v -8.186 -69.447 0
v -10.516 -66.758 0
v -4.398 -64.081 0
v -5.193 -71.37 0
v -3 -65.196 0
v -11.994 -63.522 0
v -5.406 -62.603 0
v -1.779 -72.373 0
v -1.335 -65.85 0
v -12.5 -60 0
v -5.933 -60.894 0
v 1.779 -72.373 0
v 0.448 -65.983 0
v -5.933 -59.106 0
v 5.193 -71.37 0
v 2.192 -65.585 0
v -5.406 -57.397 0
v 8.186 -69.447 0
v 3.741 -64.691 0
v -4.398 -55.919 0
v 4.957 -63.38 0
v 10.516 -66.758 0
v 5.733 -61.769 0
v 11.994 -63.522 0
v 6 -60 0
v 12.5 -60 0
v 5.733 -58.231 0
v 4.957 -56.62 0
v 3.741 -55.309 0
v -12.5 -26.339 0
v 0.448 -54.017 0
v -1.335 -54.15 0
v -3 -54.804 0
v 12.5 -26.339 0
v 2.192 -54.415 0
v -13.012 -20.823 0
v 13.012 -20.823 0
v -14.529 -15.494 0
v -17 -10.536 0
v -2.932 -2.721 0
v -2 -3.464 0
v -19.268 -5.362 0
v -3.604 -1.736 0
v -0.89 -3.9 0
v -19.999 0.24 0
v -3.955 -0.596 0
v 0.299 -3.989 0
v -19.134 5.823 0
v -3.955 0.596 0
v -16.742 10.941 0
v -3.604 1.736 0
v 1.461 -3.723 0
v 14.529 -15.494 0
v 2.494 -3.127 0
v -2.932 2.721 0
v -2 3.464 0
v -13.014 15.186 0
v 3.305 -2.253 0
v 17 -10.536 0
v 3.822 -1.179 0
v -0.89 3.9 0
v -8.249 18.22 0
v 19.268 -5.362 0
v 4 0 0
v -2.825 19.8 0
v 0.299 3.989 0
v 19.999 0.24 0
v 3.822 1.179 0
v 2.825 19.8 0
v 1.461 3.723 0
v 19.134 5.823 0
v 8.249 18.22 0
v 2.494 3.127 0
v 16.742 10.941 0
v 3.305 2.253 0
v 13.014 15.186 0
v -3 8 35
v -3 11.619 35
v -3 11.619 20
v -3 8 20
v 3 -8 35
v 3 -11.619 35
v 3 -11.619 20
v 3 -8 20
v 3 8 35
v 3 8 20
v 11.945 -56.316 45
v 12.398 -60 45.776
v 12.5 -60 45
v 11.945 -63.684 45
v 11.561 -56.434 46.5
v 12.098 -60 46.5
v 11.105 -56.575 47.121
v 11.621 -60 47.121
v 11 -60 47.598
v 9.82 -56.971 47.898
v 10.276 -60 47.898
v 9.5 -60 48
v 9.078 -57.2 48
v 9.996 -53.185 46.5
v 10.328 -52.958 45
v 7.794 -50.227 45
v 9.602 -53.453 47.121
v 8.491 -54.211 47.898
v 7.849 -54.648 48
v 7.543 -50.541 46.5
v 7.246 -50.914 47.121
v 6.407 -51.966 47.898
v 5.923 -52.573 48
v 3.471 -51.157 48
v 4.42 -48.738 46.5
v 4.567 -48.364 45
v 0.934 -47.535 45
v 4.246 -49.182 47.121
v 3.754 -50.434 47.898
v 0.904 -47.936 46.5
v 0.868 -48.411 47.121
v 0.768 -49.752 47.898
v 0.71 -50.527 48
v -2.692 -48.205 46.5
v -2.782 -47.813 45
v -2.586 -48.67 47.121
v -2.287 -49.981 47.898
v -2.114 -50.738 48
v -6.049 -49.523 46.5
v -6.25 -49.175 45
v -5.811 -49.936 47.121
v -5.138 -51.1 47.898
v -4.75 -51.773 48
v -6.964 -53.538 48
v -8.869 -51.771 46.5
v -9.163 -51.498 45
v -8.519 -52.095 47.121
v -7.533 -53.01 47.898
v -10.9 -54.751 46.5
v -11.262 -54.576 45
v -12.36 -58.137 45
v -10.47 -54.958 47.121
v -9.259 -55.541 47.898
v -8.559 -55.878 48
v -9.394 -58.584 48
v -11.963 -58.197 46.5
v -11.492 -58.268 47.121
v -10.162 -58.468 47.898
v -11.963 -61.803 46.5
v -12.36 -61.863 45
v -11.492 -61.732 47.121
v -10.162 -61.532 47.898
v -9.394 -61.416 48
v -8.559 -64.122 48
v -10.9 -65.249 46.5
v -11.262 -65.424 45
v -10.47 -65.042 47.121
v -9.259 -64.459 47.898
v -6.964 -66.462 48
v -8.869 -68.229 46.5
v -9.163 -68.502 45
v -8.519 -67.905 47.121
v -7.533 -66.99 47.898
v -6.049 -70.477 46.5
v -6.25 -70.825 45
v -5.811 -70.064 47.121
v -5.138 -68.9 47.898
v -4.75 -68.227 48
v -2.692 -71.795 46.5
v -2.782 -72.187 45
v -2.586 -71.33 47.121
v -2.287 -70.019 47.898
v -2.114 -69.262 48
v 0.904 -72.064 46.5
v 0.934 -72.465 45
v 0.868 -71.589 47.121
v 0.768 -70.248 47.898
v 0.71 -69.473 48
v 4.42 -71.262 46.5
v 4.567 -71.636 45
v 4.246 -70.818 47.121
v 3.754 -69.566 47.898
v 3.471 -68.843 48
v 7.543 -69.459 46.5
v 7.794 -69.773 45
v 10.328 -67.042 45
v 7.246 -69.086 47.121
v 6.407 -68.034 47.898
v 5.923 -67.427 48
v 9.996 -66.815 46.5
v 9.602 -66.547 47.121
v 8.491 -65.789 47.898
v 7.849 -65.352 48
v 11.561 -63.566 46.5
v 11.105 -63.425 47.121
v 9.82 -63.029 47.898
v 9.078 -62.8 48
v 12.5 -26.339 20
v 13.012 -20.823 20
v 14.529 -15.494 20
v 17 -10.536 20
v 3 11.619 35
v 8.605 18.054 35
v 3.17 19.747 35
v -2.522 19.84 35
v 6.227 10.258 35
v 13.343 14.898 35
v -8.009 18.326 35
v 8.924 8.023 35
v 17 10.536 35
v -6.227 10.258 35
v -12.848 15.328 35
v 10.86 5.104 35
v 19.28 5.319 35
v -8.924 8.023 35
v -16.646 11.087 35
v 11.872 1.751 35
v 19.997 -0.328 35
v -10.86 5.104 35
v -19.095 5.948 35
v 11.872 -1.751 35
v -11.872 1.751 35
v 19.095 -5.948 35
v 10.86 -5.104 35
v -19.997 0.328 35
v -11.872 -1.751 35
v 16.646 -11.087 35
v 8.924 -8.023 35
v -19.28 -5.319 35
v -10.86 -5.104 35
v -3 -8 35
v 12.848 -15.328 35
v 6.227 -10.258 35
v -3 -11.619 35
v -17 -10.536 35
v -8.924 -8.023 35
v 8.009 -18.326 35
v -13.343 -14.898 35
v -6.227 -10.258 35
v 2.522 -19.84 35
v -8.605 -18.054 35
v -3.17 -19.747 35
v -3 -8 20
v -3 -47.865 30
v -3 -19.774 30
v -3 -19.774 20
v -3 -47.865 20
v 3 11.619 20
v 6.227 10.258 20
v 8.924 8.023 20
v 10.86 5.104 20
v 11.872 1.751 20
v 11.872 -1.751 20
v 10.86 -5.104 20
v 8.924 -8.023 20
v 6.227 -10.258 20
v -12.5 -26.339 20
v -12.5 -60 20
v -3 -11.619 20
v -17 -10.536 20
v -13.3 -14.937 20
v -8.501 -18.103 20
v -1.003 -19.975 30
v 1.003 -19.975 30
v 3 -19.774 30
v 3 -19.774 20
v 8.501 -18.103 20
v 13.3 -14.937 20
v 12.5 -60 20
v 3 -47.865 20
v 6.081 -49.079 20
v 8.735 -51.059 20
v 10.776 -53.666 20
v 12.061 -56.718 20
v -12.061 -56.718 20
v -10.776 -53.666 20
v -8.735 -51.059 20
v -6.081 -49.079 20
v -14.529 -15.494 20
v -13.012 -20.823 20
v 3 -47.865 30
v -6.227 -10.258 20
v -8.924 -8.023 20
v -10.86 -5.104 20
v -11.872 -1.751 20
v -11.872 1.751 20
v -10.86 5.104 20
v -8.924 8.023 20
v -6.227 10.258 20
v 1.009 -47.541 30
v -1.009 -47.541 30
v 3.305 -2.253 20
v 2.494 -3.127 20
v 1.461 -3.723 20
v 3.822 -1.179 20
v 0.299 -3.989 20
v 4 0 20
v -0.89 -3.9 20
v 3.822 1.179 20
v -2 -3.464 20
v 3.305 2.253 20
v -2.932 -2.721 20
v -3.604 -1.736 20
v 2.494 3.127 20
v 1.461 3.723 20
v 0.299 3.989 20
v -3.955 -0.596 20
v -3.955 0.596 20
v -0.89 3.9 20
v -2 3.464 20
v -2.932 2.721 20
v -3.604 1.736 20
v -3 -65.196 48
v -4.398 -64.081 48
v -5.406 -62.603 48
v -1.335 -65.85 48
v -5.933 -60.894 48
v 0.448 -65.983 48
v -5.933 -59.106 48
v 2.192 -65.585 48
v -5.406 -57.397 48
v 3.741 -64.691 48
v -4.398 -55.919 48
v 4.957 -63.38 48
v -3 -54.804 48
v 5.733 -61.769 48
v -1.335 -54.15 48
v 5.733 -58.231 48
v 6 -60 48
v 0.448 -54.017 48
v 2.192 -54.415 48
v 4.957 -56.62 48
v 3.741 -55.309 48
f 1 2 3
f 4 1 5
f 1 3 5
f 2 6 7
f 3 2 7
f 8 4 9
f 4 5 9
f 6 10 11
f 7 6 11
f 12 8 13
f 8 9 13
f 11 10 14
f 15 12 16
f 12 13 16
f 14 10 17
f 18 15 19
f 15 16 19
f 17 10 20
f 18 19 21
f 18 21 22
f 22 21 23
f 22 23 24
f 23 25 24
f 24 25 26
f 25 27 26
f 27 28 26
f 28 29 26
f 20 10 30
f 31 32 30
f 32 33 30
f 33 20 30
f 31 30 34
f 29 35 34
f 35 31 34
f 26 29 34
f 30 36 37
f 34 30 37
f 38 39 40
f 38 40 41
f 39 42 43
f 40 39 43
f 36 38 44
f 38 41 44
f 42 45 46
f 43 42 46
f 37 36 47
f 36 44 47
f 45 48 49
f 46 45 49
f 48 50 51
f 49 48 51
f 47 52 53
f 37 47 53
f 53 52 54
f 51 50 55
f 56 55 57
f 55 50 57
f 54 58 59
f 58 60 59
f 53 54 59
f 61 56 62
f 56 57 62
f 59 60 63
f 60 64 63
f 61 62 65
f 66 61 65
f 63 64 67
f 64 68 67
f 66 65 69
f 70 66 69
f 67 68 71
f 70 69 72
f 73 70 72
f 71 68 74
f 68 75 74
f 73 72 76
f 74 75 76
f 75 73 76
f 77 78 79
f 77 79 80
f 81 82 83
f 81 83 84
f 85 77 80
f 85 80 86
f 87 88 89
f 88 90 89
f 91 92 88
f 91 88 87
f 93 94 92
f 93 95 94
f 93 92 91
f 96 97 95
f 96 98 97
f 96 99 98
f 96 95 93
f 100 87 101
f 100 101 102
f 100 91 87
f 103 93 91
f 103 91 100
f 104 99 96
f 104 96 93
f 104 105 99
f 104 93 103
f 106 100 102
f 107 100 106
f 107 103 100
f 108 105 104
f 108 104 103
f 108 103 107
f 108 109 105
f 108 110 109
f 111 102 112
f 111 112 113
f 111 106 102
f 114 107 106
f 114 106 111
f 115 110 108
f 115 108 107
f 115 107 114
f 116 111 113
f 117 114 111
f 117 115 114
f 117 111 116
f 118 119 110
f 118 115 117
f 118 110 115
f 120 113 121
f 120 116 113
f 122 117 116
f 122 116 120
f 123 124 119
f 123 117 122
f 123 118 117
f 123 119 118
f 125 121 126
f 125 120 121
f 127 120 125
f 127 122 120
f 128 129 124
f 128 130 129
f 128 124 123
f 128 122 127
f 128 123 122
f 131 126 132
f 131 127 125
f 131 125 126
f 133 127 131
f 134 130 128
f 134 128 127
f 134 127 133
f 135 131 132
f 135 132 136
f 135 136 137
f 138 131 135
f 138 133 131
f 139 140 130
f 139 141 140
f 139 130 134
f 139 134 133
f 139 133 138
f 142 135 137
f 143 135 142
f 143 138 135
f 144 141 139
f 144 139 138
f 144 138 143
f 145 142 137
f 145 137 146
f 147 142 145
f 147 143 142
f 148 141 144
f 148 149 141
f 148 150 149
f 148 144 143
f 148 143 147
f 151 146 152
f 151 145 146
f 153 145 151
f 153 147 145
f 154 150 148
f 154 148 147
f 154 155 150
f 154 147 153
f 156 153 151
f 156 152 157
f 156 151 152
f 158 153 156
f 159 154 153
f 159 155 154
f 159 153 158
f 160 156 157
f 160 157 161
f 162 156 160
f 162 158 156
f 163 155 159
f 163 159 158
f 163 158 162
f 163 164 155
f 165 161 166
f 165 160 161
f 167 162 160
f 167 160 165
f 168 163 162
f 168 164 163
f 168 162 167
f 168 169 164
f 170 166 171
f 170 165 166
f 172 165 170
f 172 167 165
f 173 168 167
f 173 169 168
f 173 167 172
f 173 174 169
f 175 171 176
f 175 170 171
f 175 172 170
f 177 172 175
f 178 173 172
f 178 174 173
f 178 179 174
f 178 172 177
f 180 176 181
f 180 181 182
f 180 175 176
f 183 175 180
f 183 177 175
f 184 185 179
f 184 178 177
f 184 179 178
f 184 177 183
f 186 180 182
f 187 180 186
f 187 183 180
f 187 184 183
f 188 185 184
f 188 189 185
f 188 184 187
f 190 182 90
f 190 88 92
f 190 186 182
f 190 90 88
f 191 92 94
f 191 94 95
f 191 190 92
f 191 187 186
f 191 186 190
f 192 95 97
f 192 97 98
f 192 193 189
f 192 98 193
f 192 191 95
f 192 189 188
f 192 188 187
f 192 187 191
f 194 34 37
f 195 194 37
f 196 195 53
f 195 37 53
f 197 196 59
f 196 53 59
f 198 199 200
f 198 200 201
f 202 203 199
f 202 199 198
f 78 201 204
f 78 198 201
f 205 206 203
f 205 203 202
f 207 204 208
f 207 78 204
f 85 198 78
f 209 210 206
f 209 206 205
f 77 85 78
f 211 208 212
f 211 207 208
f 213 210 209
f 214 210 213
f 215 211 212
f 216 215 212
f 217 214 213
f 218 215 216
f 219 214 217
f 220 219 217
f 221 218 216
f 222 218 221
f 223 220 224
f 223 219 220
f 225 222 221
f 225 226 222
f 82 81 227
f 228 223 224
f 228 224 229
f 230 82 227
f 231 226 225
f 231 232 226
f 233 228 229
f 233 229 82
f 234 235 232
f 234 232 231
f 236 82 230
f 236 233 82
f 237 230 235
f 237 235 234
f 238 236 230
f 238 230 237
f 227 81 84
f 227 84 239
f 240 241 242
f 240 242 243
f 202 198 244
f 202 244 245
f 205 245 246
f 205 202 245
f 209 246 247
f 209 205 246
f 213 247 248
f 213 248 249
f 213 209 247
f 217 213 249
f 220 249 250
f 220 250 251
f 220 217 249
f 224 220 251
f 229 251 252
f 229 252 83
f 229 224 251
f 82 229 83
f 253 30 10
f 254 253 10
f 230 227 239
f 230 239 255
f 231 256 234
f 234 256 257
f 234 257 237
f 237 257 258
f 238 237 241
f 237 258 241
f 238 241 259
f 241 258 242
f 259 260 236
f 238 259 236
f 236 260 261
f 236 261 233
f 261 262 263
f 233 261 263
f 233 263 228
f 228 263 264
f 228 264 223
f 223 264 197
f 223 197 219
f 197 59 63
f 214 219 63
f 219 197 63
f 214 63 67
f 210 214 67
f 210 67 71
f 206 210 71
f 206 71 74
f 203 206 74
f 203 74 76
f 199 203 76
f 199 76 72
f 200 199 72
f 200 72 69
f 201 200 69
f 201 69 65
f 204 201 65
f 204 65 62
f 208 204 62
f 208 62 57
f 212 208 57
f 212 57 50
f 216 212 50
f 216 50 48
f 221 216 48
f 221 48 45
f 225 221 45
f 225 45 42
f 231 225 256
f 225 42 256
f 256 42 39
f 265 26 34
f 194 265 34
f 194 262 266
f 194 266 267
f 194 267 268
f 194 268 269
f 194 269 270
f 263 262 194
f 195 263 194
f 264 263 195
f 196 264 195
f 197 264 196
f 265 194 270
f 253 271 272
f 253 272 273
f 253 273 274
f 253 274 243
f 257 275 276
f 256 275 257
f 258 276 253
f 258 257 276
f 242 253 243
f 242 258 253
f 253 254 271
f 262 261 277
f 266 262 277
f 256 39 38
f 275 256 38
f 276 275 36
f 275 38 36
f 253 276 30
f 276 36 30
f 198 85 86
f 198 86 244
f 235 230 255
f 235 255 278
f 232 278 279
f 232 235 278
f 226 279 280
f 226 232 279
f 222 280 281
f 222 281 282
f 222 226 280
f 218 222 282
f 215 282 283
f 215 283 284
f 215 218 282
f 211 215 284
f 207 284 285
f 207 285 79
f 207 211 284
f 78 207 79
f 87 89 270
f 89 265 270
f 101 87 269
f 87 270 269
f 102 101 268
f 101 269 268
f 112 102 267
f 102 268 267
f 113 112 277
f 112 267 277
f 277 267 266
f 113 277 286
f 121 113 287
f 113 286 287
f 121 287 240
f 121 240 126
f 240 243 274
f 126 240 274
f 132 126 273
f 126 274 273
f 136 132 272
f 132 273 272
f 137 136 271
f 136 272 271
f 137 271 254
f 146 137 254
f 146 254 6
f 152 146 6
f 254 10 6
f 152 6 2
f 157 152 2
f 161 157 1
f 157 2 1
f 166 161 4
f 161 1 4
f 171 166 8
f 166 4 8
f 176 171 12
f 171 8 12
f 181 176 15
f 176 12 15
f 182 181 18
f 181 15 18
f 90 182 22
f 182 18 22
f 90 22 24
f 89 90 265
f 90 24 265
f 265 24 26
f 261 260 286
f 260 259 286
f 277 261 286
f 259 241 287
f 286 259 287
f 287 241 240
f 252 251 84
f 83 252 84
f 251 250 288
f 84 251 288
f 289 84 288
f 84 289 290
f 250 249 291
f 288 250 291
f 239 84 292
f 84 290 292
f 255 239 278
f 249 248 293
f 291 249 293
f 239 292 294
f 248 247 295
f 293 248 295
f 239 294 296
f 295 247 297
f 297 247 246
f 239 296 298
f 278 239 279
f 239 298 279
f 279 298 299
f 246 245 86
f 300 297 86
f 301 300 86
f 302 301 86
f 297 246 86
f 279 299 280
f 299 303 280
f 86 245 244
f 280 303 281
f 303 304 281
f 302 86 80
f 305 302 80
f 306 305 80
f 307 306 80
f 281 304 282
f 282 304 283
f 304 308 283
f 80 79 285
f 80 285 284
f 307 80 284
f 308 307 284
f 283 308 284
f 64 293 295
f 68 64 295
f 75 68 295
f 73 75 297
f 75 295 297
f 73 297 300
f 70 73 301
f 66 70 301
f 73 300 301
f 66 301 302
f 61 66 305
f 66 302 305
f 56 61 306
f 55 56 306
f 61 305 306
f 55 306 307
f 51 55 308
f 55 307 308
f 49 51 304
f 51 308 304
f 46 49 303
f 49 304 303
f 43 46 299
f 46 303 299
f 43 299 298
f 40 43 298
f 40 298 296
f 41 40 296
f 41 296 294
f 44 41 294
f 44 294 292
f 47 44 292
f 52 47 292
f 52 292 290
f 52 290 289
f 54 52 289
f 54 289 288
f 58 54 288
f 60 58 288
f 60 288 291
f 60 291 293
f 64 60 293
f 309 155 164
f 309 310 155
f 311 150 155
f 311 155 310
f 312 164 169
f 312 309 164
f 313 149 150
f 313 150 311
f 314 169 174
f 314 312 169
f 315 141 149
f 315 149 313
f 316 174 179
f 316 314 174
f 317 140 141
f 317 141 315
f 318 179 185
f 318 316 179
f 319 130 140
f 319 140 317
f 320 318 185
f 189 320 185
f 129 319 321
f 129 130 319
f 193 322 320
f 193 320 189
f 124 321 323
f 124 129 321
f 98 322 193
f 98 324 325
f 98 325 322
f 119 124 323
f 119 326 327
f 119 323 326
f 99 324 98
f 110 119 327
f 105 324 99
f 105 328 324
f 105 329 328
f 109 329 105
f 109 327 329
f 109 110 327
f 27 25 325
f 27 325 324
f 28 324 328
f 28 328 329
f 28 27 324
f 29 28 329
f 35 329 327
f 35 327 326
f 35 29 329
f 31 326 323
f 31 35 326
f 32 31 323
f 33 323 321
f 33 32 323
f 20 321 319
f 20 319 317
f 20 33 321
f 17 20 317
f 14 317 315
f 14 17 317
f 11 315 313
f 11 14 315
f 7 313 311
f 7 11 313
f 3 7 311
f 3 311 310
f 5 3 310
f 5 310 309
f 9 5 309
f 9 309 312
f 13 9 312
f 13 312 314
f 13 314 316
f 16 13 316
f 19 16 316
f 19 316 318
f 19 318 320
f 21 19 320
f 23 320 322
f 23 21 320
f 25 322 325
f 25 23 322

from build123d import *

# Parameters (mm, degrees)
SALIENTE_EXTRUIR1_DEPTH = 20
CROQUIS2_R              = 20
SALIENTE_EXTRUIR2_DEPTH = 35
CORTAR_EXTRUIR1_DEPTH   = 15
CORTAR_EXTRUIR2_REACH   = 68.332
CROQUIS4_R              = 4
CROQUIS5_R              = 12.5
CROQUIS5_R_2            = 6
SALIENTE_EXTRUIR3_DEPTH = 48
REDONDEO1_R             = 3
NERVIO1_REACH           = 91.22
CROQUIS6_WALL_W         = 207.940466532
CROQUIS6_WALL_H         = 6


with BuildPart() as part:
    # Croquis1 → Saliente-Extruir1 (new body)
    with BuildSketch(Plane.XY):
        with BuildLine():
            Line((-12.5, -26.339134382), (-12.5, -60))
            ThreePointArc((-12.5, -60), (0, -47.5), (12.5, -60))
            Line((12.5, -60), (12.5, -26.339134382))
            ThreePointArc((12.5, -26.339134382), (13.646923907, -18.12329602), (17, -10.535653753))
            ThreePointArc((17, -10.535653753), (0, -20), (-17, -10.535653753))
            ThreePointArc((-17, -10.535653753), (-13.646923907, -18.12329602), (-12.5, -26.339134382))
        make_face()
    extrude(amount=SALIENTE_EXTRUIR1_DEPTH)

    # Croquis2 → Saliente-Extruir2 (add)
    with BuildSketch(Plane.XY):
        with Locations(Location((0, 0, 0), (0, 0, 211.788330617))):
            Circle(CROQUIS2_R)
    extrude(amount=SALIENTE_EXTRUIR2_DEPTH)

    # Croquis3 → Cortar-Extruir1 (cut)
    with BuildSketch(Plane.XY.offset(35)):
        with BuildLine():
            Line((-3, 11.618950039), (-3, 8))
            Line((-3, 8), (3, 8))
            Line((3, 8), (3, 11.618950039))
            ThreePointArc((3, 11.618950039), (12, 0), (3, -11.618950039))
            Line((3, -11.618950039), (3, -8))
            Line((3, -8), (-3, -8))
            Line((-3, -8), (-3, -11.618950039))
            ThreePointArc((-3, -11.618950039), (-12, 0), (-3, 11.618950039))
        make_face()
    extrude(amount=-CORTAR_EXTRUIR1_DEPTH, mode=Mode.SUBTRACT)

    # Croquis4 → Cortar-Extruir2 (cut, up to next)
    with BuildSketch(Plane.XY.offset(20), mode=Mode.PRIVATE) as cortar_extruir2_sk1:
        Circle(CROQUIS4_R)
    cortar_extruir2_tool1 = extrude(cortar_extruir2_sk1.sketch, amount=-CORTAR_EXTRUIR2_REACH, mode=Mode.PRIVATE) & part.part
    add(cortar_extruir2_tool1.solids().sort_by_distance((0, 0, 20))[0], mode=Mode.SUBTRACT)

    # Croquis5 → Saliente-Extruir3 (add)
    with BuildSketch(Plane.XY):
        with Locations((0, -60)):
            Circle(CROQUIS5_R)
        with Locations((0, -60)):
            Circle(CROQUIS5_R_2, mode=Mode.SUBTRACT)
    extrude(amount=SALIENTE_EXTRUIR3_DEPTH)

    # Redondeo1
    redondeo1_edges = [part.edges().sort_by_distance(p)[0] for p in [
        (-12.5, -60, 48),
    ]]
    fillet(redondeo1_edges, radius=REDONDEO1_R)

    # Croquis6 wall → Nervio1 (add, up to next)
    with BuildSketch(Plane(origin=(0, -33.75, 30), x_dir=(0, -1, 0), z_dir=(0, 0, -1)), mode=Mode.PRIVATE) as nervio1_sk1:
        Rectangle(CROQUIS6_WALL_W, CROQUIS6_WALL_H)
    nervio1_tool1 = extrude(nervio1_sk1.sketch, amount=NERVIO1_REACH, mode=Mode.PRIVATE) - part.part
    add(nervio1_tool1.solids().sort_by_distance((0, -33.75, 30))[0])


solid = part.part
